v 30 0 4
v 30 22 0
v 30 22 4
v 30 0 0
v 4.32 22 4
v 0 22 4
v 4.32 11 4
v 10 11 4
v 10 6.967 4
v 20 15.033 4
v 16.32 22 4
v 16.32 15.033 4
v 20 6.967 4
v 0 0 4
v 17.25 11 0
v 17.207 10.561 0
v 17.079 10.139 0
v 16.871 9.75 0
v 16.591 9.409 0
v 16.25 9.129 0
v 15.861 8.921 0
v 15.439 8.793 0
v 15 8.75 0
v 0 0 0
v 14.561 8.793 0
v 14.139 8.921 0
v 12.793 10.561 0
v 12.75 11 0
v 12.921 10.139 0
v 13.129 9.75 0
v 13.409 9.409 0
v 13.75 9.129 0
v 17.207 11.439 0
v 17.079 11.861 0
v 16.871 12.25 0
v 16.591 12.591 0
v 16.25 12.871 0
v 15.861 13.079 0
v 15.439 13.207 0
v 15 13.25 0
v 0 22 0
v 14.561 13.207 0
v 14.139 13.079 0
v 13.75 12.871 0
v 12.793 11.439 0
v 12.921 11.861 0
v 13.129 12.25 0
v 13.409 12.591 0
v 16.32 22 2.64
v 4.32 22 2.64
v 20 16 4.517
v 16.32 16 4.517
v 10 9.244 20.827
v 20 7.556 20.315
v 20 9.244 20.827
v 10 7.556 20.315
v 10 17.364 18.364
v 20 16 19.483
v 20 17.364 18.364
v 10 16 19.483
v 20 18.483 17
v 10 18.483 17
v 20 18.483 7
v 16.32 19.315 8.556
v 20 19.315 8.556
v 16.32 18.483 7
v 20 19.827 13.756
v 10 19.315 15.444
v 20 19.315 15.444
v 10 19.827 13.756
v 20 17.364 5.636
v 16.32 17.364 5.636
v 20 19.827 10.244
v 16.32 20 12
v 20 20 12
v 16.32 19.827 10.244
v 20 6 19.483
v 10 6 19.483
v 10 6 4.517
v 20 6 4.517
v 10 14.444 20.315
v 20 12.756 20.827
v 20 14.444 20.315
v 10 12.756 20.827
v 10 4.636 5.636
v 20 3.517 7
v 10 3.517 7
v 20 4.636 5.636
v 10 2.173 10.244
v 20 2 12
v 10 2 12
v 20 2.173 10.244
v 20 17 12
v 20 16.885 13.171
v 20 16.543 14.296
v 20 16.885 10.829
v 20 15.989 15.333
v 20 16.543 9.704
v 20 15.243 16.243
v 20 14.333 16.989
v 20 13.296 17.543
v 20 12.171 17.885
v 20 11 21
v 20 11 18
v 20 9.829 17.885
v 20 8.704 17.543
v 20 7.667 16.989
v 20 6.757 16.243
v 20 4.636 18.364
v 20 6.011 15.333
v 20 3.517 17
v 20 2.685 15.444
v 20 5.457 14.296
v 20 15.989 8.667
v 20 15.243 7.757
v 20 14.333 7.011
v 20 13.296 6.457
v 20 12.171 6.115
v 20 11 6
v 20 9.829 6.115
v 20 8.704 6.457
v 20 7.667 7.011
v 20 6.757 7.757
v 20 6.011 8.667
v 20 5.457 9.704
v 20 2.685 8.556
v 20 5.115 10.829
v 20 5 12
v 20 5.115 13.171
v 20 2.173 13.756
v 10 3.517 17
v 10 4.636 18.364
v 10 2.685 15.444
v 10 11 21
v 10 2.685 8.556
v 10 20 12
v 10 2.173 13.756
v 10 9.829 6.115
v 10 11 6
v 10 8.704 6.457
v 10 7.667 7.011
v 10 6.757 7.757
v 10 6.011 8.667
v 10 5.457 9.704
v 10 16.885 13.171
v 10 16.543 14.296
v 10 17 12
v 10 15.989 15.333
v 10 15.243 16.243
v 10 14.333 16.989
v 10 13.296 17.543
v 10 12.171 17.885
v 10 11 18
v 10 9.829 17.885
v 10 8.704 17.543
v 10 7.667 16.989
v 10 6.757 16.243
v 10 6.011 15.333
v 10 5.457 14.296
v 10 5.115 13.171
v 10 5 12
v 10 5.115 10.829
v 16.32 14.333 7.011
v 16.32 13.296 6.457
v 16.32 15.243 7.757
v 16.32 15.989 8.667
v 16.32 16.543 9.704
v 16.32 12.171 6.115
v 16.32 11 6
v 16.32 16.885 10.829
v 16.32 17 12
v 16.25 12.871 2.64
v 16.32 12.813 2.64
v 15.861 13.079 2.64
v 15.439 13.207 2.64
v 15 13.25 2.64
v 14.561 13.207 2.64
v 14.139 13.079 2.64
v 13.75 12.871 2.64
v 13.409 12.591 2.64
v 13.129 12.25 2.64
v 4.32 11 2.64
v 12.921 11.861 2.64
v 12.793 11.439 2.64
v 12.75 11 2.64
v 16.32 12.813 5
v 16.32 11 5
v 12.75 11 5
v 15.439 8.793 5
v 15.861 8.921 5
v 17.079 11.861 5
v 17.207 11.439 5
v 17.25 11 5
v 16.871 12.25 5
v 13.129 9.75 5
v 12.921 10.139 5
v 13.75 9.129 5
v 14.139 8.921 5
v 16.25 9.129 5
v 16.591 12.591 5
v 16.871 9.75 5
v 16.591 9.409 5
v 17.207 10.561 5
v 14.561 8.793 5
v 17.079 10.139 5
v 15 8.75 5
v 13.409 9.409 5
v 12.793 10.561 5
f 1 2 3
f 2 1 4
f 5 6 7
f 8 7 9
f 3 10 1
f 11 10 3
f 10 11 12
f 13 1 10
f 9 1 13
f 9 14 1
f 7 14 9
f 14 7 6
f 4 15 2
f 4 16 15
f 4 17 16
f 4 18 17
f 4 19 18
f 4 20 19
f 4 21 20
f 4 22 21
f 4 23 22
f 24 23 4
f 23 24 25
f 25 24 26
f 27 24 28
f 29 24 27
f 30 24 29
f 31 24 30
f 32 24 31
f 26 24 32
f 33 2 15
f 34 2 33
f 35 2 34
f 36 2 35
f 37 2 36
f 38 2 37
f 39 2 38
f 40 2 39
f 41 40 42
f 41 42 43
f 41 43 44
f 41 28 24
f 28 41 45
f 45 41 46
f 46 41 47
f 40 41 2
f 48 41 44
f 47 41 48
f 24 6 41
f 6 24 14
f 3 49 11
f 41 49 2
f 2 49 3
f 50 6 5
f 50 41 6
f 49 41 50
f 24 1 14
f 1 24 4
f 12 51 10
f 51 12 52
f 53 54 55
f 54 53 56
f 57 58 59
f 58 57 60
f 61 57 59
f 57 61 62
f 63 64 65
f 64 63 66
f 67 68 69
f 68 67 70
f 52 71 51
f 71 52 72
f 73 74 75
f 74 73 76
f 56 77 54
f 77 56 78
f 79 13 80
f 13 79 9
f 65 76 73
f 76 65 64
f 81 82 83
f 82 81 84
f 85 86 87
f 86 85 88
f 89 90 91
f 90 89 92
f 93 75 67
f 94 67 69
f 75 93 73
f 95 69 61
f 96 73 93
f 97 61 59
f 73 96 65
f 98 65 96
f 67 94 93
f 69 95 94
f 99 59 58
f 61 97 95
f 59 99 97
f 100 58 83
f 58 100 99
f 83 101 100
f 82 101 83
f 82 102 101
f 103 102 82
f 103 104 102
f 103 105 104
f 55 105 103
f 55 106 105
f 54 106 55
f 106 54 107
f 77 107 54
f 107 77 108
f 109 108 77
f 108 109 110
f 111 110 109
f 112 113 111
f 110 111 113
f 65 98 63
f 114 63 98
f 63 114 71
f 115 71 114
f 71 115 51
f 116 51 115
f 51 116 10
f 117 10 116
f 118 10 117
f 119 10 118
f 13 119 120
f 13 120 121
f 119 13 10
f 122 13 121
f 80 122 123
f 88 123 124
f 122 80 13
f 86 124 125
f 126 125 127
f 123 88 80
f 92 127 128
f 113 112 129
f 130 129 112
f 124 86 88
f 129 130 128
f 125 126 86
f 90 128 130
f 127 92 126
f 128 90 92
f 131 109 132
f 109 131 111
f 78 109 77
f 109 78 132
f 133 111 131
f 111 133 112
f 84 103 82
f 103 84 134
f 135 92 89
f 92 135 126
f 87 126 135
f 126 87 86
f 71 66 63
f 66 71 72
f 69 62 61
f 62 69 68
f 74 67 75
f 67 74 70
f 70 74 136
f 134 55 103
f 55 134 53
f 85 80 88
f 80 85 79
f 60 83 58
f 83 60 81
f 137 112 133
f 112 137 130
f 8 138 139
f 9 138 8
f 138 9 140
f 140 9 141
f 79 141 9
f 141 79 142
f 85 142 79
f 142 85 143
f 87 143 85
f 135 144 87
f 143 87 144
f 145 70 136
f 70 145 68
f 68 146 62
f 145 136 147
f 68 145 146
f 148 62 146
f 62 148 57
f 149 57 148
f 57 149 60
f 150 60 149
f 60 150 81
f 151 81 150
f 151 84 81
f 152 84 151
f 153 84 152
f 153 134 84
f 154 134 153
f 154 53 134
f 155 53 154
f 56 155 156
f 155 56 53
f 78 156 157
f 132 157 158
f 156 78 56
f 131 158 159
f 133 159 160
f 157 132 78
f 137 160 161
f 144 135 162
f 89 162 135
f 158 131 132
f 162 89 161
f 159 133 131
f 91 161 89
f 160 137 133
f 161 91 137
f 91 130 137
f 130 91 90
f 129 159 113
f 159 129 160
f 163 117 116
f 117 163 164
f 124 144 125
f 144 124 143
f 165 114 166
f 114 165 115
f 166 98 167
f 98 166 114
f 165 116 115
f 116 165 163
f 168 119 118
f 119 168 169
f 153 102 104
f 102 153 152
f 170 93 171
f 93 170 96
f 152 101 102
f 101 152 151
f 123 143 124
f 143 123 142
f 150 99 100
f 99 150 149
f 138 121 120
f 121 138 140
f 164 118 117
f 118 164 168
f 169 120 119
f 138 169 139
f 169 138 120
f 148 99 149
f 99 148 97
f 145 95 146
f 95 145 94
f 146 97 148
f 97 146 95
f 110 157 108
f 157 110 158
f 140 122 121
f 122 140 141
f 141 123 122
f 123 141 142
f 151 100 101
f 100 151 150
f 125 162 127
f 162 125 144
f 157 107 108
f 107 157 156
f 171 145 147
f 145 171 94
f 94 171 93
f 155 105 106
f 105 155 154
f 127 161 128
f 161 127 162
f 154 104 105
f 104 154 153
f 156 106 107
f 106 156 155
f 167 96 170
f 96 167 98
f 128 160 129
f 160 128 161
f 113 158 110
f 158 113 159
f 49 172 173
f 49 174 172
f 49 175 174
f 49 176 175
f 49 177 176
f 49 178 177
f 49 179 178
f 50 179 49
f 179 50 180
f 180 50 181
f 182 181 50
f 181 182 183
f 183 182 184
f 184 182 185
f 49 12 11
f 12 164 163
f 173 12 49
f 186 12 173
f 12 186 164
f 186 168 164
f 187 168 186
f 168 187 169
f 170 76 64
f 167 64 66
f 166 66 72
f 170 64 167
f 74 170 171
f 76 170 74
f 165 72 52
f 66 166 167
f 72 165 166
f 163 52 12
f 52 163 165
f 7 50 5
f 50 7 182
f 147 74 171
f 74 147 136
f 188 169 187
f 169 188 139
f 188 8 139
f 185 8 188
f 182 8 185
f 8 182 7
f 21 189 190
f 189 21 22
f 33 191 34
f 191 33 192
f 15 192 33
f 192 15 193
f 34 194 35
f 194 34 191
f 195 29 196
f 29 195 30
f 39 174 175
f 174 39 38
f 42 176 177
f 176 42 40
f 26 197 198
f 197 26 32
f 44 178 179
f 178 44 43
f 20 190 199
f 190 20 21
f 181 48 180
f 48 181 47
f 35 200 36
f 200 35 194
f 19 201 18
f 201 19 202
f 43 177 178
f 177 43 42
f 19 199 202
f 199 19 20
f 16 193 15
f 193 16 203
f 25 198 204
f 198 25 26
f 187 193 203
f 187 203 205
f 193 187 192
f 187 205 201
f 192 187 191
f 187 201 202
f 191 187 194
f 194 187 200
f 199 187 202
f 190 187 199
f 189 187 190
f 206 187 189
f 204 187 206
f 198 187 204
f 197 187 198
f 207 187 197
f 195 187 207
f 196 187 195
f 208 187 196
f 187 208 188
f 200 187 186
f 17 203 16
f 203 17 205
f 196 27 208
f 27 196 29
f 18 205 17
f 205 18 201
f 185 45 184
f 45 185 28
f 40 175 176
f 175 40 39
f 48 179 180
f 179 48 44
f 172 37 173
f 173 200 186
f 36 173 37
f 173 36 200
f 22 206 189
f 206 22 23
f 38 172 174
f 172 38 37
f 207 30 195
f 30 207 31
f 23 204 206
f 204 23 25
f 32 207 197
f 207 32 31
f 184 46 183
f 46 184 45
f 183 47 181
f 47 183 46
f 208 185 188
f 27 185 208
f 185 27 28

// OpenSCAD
$fn = 32;

// ----------------------------------------------------------------------
// Cable clip: cable 12 mm, clamp 18 mm, base 30 mm
// ----------------------------------------------------------------------

// --- parameters (mm) ---
foot_w = 30;              // base length, X
foot_d = 22;              // base width, Y
foot_t = 4;               // base thickness
hose_seat_d = 18;         // clamp outside diameter
ring_t = 3;               // clamp wall
cable_d = 12;             // cable opening
ring_w = 10;              // clamp width along the cable
screw_d = 4.5;            // screw clearance
throat = 9.36;            // snap throat width
sink = 1;                 // overlap of the clamp into the base

module base() {
  cube([foot_w, foot_d, foot_t]);
}

module clamp() {
  translate([foot_w / 2, foot_d / 2, foot_t + hose_seat_d / 2 - sink]) rotate([0, 90, 0])
    cylinder(h = ring_w, d = hose_seat_d, center = true);
}

difference() {
  union() {
    base();
    clamp();
  }
  translate([foot_w / 2, foot_d / 2, foot_t + hose_seat_d / 2 - sink]) rotate([0, 90, 0]) translate([0, 0, -ring_w / 2 - 1]) cylinder(h = ring_w + 2, d = cable_d);
  /* snap throat: the opening is narrower than the cable */
  translate([foot_w / 2 - throat / 2, foot_d / 2, foot_t + hose_seat_d / 2 - sink]) rotate([0, 90, 0]) translate([0, 0, -ring_w / 2 - 1]) cube([throat, hose_seat_d + 2, ring_w + 2]);
  translate([15, foot_d / 2, -1]) cylinder(h = foot_t + 2, d = screw_d);
}
